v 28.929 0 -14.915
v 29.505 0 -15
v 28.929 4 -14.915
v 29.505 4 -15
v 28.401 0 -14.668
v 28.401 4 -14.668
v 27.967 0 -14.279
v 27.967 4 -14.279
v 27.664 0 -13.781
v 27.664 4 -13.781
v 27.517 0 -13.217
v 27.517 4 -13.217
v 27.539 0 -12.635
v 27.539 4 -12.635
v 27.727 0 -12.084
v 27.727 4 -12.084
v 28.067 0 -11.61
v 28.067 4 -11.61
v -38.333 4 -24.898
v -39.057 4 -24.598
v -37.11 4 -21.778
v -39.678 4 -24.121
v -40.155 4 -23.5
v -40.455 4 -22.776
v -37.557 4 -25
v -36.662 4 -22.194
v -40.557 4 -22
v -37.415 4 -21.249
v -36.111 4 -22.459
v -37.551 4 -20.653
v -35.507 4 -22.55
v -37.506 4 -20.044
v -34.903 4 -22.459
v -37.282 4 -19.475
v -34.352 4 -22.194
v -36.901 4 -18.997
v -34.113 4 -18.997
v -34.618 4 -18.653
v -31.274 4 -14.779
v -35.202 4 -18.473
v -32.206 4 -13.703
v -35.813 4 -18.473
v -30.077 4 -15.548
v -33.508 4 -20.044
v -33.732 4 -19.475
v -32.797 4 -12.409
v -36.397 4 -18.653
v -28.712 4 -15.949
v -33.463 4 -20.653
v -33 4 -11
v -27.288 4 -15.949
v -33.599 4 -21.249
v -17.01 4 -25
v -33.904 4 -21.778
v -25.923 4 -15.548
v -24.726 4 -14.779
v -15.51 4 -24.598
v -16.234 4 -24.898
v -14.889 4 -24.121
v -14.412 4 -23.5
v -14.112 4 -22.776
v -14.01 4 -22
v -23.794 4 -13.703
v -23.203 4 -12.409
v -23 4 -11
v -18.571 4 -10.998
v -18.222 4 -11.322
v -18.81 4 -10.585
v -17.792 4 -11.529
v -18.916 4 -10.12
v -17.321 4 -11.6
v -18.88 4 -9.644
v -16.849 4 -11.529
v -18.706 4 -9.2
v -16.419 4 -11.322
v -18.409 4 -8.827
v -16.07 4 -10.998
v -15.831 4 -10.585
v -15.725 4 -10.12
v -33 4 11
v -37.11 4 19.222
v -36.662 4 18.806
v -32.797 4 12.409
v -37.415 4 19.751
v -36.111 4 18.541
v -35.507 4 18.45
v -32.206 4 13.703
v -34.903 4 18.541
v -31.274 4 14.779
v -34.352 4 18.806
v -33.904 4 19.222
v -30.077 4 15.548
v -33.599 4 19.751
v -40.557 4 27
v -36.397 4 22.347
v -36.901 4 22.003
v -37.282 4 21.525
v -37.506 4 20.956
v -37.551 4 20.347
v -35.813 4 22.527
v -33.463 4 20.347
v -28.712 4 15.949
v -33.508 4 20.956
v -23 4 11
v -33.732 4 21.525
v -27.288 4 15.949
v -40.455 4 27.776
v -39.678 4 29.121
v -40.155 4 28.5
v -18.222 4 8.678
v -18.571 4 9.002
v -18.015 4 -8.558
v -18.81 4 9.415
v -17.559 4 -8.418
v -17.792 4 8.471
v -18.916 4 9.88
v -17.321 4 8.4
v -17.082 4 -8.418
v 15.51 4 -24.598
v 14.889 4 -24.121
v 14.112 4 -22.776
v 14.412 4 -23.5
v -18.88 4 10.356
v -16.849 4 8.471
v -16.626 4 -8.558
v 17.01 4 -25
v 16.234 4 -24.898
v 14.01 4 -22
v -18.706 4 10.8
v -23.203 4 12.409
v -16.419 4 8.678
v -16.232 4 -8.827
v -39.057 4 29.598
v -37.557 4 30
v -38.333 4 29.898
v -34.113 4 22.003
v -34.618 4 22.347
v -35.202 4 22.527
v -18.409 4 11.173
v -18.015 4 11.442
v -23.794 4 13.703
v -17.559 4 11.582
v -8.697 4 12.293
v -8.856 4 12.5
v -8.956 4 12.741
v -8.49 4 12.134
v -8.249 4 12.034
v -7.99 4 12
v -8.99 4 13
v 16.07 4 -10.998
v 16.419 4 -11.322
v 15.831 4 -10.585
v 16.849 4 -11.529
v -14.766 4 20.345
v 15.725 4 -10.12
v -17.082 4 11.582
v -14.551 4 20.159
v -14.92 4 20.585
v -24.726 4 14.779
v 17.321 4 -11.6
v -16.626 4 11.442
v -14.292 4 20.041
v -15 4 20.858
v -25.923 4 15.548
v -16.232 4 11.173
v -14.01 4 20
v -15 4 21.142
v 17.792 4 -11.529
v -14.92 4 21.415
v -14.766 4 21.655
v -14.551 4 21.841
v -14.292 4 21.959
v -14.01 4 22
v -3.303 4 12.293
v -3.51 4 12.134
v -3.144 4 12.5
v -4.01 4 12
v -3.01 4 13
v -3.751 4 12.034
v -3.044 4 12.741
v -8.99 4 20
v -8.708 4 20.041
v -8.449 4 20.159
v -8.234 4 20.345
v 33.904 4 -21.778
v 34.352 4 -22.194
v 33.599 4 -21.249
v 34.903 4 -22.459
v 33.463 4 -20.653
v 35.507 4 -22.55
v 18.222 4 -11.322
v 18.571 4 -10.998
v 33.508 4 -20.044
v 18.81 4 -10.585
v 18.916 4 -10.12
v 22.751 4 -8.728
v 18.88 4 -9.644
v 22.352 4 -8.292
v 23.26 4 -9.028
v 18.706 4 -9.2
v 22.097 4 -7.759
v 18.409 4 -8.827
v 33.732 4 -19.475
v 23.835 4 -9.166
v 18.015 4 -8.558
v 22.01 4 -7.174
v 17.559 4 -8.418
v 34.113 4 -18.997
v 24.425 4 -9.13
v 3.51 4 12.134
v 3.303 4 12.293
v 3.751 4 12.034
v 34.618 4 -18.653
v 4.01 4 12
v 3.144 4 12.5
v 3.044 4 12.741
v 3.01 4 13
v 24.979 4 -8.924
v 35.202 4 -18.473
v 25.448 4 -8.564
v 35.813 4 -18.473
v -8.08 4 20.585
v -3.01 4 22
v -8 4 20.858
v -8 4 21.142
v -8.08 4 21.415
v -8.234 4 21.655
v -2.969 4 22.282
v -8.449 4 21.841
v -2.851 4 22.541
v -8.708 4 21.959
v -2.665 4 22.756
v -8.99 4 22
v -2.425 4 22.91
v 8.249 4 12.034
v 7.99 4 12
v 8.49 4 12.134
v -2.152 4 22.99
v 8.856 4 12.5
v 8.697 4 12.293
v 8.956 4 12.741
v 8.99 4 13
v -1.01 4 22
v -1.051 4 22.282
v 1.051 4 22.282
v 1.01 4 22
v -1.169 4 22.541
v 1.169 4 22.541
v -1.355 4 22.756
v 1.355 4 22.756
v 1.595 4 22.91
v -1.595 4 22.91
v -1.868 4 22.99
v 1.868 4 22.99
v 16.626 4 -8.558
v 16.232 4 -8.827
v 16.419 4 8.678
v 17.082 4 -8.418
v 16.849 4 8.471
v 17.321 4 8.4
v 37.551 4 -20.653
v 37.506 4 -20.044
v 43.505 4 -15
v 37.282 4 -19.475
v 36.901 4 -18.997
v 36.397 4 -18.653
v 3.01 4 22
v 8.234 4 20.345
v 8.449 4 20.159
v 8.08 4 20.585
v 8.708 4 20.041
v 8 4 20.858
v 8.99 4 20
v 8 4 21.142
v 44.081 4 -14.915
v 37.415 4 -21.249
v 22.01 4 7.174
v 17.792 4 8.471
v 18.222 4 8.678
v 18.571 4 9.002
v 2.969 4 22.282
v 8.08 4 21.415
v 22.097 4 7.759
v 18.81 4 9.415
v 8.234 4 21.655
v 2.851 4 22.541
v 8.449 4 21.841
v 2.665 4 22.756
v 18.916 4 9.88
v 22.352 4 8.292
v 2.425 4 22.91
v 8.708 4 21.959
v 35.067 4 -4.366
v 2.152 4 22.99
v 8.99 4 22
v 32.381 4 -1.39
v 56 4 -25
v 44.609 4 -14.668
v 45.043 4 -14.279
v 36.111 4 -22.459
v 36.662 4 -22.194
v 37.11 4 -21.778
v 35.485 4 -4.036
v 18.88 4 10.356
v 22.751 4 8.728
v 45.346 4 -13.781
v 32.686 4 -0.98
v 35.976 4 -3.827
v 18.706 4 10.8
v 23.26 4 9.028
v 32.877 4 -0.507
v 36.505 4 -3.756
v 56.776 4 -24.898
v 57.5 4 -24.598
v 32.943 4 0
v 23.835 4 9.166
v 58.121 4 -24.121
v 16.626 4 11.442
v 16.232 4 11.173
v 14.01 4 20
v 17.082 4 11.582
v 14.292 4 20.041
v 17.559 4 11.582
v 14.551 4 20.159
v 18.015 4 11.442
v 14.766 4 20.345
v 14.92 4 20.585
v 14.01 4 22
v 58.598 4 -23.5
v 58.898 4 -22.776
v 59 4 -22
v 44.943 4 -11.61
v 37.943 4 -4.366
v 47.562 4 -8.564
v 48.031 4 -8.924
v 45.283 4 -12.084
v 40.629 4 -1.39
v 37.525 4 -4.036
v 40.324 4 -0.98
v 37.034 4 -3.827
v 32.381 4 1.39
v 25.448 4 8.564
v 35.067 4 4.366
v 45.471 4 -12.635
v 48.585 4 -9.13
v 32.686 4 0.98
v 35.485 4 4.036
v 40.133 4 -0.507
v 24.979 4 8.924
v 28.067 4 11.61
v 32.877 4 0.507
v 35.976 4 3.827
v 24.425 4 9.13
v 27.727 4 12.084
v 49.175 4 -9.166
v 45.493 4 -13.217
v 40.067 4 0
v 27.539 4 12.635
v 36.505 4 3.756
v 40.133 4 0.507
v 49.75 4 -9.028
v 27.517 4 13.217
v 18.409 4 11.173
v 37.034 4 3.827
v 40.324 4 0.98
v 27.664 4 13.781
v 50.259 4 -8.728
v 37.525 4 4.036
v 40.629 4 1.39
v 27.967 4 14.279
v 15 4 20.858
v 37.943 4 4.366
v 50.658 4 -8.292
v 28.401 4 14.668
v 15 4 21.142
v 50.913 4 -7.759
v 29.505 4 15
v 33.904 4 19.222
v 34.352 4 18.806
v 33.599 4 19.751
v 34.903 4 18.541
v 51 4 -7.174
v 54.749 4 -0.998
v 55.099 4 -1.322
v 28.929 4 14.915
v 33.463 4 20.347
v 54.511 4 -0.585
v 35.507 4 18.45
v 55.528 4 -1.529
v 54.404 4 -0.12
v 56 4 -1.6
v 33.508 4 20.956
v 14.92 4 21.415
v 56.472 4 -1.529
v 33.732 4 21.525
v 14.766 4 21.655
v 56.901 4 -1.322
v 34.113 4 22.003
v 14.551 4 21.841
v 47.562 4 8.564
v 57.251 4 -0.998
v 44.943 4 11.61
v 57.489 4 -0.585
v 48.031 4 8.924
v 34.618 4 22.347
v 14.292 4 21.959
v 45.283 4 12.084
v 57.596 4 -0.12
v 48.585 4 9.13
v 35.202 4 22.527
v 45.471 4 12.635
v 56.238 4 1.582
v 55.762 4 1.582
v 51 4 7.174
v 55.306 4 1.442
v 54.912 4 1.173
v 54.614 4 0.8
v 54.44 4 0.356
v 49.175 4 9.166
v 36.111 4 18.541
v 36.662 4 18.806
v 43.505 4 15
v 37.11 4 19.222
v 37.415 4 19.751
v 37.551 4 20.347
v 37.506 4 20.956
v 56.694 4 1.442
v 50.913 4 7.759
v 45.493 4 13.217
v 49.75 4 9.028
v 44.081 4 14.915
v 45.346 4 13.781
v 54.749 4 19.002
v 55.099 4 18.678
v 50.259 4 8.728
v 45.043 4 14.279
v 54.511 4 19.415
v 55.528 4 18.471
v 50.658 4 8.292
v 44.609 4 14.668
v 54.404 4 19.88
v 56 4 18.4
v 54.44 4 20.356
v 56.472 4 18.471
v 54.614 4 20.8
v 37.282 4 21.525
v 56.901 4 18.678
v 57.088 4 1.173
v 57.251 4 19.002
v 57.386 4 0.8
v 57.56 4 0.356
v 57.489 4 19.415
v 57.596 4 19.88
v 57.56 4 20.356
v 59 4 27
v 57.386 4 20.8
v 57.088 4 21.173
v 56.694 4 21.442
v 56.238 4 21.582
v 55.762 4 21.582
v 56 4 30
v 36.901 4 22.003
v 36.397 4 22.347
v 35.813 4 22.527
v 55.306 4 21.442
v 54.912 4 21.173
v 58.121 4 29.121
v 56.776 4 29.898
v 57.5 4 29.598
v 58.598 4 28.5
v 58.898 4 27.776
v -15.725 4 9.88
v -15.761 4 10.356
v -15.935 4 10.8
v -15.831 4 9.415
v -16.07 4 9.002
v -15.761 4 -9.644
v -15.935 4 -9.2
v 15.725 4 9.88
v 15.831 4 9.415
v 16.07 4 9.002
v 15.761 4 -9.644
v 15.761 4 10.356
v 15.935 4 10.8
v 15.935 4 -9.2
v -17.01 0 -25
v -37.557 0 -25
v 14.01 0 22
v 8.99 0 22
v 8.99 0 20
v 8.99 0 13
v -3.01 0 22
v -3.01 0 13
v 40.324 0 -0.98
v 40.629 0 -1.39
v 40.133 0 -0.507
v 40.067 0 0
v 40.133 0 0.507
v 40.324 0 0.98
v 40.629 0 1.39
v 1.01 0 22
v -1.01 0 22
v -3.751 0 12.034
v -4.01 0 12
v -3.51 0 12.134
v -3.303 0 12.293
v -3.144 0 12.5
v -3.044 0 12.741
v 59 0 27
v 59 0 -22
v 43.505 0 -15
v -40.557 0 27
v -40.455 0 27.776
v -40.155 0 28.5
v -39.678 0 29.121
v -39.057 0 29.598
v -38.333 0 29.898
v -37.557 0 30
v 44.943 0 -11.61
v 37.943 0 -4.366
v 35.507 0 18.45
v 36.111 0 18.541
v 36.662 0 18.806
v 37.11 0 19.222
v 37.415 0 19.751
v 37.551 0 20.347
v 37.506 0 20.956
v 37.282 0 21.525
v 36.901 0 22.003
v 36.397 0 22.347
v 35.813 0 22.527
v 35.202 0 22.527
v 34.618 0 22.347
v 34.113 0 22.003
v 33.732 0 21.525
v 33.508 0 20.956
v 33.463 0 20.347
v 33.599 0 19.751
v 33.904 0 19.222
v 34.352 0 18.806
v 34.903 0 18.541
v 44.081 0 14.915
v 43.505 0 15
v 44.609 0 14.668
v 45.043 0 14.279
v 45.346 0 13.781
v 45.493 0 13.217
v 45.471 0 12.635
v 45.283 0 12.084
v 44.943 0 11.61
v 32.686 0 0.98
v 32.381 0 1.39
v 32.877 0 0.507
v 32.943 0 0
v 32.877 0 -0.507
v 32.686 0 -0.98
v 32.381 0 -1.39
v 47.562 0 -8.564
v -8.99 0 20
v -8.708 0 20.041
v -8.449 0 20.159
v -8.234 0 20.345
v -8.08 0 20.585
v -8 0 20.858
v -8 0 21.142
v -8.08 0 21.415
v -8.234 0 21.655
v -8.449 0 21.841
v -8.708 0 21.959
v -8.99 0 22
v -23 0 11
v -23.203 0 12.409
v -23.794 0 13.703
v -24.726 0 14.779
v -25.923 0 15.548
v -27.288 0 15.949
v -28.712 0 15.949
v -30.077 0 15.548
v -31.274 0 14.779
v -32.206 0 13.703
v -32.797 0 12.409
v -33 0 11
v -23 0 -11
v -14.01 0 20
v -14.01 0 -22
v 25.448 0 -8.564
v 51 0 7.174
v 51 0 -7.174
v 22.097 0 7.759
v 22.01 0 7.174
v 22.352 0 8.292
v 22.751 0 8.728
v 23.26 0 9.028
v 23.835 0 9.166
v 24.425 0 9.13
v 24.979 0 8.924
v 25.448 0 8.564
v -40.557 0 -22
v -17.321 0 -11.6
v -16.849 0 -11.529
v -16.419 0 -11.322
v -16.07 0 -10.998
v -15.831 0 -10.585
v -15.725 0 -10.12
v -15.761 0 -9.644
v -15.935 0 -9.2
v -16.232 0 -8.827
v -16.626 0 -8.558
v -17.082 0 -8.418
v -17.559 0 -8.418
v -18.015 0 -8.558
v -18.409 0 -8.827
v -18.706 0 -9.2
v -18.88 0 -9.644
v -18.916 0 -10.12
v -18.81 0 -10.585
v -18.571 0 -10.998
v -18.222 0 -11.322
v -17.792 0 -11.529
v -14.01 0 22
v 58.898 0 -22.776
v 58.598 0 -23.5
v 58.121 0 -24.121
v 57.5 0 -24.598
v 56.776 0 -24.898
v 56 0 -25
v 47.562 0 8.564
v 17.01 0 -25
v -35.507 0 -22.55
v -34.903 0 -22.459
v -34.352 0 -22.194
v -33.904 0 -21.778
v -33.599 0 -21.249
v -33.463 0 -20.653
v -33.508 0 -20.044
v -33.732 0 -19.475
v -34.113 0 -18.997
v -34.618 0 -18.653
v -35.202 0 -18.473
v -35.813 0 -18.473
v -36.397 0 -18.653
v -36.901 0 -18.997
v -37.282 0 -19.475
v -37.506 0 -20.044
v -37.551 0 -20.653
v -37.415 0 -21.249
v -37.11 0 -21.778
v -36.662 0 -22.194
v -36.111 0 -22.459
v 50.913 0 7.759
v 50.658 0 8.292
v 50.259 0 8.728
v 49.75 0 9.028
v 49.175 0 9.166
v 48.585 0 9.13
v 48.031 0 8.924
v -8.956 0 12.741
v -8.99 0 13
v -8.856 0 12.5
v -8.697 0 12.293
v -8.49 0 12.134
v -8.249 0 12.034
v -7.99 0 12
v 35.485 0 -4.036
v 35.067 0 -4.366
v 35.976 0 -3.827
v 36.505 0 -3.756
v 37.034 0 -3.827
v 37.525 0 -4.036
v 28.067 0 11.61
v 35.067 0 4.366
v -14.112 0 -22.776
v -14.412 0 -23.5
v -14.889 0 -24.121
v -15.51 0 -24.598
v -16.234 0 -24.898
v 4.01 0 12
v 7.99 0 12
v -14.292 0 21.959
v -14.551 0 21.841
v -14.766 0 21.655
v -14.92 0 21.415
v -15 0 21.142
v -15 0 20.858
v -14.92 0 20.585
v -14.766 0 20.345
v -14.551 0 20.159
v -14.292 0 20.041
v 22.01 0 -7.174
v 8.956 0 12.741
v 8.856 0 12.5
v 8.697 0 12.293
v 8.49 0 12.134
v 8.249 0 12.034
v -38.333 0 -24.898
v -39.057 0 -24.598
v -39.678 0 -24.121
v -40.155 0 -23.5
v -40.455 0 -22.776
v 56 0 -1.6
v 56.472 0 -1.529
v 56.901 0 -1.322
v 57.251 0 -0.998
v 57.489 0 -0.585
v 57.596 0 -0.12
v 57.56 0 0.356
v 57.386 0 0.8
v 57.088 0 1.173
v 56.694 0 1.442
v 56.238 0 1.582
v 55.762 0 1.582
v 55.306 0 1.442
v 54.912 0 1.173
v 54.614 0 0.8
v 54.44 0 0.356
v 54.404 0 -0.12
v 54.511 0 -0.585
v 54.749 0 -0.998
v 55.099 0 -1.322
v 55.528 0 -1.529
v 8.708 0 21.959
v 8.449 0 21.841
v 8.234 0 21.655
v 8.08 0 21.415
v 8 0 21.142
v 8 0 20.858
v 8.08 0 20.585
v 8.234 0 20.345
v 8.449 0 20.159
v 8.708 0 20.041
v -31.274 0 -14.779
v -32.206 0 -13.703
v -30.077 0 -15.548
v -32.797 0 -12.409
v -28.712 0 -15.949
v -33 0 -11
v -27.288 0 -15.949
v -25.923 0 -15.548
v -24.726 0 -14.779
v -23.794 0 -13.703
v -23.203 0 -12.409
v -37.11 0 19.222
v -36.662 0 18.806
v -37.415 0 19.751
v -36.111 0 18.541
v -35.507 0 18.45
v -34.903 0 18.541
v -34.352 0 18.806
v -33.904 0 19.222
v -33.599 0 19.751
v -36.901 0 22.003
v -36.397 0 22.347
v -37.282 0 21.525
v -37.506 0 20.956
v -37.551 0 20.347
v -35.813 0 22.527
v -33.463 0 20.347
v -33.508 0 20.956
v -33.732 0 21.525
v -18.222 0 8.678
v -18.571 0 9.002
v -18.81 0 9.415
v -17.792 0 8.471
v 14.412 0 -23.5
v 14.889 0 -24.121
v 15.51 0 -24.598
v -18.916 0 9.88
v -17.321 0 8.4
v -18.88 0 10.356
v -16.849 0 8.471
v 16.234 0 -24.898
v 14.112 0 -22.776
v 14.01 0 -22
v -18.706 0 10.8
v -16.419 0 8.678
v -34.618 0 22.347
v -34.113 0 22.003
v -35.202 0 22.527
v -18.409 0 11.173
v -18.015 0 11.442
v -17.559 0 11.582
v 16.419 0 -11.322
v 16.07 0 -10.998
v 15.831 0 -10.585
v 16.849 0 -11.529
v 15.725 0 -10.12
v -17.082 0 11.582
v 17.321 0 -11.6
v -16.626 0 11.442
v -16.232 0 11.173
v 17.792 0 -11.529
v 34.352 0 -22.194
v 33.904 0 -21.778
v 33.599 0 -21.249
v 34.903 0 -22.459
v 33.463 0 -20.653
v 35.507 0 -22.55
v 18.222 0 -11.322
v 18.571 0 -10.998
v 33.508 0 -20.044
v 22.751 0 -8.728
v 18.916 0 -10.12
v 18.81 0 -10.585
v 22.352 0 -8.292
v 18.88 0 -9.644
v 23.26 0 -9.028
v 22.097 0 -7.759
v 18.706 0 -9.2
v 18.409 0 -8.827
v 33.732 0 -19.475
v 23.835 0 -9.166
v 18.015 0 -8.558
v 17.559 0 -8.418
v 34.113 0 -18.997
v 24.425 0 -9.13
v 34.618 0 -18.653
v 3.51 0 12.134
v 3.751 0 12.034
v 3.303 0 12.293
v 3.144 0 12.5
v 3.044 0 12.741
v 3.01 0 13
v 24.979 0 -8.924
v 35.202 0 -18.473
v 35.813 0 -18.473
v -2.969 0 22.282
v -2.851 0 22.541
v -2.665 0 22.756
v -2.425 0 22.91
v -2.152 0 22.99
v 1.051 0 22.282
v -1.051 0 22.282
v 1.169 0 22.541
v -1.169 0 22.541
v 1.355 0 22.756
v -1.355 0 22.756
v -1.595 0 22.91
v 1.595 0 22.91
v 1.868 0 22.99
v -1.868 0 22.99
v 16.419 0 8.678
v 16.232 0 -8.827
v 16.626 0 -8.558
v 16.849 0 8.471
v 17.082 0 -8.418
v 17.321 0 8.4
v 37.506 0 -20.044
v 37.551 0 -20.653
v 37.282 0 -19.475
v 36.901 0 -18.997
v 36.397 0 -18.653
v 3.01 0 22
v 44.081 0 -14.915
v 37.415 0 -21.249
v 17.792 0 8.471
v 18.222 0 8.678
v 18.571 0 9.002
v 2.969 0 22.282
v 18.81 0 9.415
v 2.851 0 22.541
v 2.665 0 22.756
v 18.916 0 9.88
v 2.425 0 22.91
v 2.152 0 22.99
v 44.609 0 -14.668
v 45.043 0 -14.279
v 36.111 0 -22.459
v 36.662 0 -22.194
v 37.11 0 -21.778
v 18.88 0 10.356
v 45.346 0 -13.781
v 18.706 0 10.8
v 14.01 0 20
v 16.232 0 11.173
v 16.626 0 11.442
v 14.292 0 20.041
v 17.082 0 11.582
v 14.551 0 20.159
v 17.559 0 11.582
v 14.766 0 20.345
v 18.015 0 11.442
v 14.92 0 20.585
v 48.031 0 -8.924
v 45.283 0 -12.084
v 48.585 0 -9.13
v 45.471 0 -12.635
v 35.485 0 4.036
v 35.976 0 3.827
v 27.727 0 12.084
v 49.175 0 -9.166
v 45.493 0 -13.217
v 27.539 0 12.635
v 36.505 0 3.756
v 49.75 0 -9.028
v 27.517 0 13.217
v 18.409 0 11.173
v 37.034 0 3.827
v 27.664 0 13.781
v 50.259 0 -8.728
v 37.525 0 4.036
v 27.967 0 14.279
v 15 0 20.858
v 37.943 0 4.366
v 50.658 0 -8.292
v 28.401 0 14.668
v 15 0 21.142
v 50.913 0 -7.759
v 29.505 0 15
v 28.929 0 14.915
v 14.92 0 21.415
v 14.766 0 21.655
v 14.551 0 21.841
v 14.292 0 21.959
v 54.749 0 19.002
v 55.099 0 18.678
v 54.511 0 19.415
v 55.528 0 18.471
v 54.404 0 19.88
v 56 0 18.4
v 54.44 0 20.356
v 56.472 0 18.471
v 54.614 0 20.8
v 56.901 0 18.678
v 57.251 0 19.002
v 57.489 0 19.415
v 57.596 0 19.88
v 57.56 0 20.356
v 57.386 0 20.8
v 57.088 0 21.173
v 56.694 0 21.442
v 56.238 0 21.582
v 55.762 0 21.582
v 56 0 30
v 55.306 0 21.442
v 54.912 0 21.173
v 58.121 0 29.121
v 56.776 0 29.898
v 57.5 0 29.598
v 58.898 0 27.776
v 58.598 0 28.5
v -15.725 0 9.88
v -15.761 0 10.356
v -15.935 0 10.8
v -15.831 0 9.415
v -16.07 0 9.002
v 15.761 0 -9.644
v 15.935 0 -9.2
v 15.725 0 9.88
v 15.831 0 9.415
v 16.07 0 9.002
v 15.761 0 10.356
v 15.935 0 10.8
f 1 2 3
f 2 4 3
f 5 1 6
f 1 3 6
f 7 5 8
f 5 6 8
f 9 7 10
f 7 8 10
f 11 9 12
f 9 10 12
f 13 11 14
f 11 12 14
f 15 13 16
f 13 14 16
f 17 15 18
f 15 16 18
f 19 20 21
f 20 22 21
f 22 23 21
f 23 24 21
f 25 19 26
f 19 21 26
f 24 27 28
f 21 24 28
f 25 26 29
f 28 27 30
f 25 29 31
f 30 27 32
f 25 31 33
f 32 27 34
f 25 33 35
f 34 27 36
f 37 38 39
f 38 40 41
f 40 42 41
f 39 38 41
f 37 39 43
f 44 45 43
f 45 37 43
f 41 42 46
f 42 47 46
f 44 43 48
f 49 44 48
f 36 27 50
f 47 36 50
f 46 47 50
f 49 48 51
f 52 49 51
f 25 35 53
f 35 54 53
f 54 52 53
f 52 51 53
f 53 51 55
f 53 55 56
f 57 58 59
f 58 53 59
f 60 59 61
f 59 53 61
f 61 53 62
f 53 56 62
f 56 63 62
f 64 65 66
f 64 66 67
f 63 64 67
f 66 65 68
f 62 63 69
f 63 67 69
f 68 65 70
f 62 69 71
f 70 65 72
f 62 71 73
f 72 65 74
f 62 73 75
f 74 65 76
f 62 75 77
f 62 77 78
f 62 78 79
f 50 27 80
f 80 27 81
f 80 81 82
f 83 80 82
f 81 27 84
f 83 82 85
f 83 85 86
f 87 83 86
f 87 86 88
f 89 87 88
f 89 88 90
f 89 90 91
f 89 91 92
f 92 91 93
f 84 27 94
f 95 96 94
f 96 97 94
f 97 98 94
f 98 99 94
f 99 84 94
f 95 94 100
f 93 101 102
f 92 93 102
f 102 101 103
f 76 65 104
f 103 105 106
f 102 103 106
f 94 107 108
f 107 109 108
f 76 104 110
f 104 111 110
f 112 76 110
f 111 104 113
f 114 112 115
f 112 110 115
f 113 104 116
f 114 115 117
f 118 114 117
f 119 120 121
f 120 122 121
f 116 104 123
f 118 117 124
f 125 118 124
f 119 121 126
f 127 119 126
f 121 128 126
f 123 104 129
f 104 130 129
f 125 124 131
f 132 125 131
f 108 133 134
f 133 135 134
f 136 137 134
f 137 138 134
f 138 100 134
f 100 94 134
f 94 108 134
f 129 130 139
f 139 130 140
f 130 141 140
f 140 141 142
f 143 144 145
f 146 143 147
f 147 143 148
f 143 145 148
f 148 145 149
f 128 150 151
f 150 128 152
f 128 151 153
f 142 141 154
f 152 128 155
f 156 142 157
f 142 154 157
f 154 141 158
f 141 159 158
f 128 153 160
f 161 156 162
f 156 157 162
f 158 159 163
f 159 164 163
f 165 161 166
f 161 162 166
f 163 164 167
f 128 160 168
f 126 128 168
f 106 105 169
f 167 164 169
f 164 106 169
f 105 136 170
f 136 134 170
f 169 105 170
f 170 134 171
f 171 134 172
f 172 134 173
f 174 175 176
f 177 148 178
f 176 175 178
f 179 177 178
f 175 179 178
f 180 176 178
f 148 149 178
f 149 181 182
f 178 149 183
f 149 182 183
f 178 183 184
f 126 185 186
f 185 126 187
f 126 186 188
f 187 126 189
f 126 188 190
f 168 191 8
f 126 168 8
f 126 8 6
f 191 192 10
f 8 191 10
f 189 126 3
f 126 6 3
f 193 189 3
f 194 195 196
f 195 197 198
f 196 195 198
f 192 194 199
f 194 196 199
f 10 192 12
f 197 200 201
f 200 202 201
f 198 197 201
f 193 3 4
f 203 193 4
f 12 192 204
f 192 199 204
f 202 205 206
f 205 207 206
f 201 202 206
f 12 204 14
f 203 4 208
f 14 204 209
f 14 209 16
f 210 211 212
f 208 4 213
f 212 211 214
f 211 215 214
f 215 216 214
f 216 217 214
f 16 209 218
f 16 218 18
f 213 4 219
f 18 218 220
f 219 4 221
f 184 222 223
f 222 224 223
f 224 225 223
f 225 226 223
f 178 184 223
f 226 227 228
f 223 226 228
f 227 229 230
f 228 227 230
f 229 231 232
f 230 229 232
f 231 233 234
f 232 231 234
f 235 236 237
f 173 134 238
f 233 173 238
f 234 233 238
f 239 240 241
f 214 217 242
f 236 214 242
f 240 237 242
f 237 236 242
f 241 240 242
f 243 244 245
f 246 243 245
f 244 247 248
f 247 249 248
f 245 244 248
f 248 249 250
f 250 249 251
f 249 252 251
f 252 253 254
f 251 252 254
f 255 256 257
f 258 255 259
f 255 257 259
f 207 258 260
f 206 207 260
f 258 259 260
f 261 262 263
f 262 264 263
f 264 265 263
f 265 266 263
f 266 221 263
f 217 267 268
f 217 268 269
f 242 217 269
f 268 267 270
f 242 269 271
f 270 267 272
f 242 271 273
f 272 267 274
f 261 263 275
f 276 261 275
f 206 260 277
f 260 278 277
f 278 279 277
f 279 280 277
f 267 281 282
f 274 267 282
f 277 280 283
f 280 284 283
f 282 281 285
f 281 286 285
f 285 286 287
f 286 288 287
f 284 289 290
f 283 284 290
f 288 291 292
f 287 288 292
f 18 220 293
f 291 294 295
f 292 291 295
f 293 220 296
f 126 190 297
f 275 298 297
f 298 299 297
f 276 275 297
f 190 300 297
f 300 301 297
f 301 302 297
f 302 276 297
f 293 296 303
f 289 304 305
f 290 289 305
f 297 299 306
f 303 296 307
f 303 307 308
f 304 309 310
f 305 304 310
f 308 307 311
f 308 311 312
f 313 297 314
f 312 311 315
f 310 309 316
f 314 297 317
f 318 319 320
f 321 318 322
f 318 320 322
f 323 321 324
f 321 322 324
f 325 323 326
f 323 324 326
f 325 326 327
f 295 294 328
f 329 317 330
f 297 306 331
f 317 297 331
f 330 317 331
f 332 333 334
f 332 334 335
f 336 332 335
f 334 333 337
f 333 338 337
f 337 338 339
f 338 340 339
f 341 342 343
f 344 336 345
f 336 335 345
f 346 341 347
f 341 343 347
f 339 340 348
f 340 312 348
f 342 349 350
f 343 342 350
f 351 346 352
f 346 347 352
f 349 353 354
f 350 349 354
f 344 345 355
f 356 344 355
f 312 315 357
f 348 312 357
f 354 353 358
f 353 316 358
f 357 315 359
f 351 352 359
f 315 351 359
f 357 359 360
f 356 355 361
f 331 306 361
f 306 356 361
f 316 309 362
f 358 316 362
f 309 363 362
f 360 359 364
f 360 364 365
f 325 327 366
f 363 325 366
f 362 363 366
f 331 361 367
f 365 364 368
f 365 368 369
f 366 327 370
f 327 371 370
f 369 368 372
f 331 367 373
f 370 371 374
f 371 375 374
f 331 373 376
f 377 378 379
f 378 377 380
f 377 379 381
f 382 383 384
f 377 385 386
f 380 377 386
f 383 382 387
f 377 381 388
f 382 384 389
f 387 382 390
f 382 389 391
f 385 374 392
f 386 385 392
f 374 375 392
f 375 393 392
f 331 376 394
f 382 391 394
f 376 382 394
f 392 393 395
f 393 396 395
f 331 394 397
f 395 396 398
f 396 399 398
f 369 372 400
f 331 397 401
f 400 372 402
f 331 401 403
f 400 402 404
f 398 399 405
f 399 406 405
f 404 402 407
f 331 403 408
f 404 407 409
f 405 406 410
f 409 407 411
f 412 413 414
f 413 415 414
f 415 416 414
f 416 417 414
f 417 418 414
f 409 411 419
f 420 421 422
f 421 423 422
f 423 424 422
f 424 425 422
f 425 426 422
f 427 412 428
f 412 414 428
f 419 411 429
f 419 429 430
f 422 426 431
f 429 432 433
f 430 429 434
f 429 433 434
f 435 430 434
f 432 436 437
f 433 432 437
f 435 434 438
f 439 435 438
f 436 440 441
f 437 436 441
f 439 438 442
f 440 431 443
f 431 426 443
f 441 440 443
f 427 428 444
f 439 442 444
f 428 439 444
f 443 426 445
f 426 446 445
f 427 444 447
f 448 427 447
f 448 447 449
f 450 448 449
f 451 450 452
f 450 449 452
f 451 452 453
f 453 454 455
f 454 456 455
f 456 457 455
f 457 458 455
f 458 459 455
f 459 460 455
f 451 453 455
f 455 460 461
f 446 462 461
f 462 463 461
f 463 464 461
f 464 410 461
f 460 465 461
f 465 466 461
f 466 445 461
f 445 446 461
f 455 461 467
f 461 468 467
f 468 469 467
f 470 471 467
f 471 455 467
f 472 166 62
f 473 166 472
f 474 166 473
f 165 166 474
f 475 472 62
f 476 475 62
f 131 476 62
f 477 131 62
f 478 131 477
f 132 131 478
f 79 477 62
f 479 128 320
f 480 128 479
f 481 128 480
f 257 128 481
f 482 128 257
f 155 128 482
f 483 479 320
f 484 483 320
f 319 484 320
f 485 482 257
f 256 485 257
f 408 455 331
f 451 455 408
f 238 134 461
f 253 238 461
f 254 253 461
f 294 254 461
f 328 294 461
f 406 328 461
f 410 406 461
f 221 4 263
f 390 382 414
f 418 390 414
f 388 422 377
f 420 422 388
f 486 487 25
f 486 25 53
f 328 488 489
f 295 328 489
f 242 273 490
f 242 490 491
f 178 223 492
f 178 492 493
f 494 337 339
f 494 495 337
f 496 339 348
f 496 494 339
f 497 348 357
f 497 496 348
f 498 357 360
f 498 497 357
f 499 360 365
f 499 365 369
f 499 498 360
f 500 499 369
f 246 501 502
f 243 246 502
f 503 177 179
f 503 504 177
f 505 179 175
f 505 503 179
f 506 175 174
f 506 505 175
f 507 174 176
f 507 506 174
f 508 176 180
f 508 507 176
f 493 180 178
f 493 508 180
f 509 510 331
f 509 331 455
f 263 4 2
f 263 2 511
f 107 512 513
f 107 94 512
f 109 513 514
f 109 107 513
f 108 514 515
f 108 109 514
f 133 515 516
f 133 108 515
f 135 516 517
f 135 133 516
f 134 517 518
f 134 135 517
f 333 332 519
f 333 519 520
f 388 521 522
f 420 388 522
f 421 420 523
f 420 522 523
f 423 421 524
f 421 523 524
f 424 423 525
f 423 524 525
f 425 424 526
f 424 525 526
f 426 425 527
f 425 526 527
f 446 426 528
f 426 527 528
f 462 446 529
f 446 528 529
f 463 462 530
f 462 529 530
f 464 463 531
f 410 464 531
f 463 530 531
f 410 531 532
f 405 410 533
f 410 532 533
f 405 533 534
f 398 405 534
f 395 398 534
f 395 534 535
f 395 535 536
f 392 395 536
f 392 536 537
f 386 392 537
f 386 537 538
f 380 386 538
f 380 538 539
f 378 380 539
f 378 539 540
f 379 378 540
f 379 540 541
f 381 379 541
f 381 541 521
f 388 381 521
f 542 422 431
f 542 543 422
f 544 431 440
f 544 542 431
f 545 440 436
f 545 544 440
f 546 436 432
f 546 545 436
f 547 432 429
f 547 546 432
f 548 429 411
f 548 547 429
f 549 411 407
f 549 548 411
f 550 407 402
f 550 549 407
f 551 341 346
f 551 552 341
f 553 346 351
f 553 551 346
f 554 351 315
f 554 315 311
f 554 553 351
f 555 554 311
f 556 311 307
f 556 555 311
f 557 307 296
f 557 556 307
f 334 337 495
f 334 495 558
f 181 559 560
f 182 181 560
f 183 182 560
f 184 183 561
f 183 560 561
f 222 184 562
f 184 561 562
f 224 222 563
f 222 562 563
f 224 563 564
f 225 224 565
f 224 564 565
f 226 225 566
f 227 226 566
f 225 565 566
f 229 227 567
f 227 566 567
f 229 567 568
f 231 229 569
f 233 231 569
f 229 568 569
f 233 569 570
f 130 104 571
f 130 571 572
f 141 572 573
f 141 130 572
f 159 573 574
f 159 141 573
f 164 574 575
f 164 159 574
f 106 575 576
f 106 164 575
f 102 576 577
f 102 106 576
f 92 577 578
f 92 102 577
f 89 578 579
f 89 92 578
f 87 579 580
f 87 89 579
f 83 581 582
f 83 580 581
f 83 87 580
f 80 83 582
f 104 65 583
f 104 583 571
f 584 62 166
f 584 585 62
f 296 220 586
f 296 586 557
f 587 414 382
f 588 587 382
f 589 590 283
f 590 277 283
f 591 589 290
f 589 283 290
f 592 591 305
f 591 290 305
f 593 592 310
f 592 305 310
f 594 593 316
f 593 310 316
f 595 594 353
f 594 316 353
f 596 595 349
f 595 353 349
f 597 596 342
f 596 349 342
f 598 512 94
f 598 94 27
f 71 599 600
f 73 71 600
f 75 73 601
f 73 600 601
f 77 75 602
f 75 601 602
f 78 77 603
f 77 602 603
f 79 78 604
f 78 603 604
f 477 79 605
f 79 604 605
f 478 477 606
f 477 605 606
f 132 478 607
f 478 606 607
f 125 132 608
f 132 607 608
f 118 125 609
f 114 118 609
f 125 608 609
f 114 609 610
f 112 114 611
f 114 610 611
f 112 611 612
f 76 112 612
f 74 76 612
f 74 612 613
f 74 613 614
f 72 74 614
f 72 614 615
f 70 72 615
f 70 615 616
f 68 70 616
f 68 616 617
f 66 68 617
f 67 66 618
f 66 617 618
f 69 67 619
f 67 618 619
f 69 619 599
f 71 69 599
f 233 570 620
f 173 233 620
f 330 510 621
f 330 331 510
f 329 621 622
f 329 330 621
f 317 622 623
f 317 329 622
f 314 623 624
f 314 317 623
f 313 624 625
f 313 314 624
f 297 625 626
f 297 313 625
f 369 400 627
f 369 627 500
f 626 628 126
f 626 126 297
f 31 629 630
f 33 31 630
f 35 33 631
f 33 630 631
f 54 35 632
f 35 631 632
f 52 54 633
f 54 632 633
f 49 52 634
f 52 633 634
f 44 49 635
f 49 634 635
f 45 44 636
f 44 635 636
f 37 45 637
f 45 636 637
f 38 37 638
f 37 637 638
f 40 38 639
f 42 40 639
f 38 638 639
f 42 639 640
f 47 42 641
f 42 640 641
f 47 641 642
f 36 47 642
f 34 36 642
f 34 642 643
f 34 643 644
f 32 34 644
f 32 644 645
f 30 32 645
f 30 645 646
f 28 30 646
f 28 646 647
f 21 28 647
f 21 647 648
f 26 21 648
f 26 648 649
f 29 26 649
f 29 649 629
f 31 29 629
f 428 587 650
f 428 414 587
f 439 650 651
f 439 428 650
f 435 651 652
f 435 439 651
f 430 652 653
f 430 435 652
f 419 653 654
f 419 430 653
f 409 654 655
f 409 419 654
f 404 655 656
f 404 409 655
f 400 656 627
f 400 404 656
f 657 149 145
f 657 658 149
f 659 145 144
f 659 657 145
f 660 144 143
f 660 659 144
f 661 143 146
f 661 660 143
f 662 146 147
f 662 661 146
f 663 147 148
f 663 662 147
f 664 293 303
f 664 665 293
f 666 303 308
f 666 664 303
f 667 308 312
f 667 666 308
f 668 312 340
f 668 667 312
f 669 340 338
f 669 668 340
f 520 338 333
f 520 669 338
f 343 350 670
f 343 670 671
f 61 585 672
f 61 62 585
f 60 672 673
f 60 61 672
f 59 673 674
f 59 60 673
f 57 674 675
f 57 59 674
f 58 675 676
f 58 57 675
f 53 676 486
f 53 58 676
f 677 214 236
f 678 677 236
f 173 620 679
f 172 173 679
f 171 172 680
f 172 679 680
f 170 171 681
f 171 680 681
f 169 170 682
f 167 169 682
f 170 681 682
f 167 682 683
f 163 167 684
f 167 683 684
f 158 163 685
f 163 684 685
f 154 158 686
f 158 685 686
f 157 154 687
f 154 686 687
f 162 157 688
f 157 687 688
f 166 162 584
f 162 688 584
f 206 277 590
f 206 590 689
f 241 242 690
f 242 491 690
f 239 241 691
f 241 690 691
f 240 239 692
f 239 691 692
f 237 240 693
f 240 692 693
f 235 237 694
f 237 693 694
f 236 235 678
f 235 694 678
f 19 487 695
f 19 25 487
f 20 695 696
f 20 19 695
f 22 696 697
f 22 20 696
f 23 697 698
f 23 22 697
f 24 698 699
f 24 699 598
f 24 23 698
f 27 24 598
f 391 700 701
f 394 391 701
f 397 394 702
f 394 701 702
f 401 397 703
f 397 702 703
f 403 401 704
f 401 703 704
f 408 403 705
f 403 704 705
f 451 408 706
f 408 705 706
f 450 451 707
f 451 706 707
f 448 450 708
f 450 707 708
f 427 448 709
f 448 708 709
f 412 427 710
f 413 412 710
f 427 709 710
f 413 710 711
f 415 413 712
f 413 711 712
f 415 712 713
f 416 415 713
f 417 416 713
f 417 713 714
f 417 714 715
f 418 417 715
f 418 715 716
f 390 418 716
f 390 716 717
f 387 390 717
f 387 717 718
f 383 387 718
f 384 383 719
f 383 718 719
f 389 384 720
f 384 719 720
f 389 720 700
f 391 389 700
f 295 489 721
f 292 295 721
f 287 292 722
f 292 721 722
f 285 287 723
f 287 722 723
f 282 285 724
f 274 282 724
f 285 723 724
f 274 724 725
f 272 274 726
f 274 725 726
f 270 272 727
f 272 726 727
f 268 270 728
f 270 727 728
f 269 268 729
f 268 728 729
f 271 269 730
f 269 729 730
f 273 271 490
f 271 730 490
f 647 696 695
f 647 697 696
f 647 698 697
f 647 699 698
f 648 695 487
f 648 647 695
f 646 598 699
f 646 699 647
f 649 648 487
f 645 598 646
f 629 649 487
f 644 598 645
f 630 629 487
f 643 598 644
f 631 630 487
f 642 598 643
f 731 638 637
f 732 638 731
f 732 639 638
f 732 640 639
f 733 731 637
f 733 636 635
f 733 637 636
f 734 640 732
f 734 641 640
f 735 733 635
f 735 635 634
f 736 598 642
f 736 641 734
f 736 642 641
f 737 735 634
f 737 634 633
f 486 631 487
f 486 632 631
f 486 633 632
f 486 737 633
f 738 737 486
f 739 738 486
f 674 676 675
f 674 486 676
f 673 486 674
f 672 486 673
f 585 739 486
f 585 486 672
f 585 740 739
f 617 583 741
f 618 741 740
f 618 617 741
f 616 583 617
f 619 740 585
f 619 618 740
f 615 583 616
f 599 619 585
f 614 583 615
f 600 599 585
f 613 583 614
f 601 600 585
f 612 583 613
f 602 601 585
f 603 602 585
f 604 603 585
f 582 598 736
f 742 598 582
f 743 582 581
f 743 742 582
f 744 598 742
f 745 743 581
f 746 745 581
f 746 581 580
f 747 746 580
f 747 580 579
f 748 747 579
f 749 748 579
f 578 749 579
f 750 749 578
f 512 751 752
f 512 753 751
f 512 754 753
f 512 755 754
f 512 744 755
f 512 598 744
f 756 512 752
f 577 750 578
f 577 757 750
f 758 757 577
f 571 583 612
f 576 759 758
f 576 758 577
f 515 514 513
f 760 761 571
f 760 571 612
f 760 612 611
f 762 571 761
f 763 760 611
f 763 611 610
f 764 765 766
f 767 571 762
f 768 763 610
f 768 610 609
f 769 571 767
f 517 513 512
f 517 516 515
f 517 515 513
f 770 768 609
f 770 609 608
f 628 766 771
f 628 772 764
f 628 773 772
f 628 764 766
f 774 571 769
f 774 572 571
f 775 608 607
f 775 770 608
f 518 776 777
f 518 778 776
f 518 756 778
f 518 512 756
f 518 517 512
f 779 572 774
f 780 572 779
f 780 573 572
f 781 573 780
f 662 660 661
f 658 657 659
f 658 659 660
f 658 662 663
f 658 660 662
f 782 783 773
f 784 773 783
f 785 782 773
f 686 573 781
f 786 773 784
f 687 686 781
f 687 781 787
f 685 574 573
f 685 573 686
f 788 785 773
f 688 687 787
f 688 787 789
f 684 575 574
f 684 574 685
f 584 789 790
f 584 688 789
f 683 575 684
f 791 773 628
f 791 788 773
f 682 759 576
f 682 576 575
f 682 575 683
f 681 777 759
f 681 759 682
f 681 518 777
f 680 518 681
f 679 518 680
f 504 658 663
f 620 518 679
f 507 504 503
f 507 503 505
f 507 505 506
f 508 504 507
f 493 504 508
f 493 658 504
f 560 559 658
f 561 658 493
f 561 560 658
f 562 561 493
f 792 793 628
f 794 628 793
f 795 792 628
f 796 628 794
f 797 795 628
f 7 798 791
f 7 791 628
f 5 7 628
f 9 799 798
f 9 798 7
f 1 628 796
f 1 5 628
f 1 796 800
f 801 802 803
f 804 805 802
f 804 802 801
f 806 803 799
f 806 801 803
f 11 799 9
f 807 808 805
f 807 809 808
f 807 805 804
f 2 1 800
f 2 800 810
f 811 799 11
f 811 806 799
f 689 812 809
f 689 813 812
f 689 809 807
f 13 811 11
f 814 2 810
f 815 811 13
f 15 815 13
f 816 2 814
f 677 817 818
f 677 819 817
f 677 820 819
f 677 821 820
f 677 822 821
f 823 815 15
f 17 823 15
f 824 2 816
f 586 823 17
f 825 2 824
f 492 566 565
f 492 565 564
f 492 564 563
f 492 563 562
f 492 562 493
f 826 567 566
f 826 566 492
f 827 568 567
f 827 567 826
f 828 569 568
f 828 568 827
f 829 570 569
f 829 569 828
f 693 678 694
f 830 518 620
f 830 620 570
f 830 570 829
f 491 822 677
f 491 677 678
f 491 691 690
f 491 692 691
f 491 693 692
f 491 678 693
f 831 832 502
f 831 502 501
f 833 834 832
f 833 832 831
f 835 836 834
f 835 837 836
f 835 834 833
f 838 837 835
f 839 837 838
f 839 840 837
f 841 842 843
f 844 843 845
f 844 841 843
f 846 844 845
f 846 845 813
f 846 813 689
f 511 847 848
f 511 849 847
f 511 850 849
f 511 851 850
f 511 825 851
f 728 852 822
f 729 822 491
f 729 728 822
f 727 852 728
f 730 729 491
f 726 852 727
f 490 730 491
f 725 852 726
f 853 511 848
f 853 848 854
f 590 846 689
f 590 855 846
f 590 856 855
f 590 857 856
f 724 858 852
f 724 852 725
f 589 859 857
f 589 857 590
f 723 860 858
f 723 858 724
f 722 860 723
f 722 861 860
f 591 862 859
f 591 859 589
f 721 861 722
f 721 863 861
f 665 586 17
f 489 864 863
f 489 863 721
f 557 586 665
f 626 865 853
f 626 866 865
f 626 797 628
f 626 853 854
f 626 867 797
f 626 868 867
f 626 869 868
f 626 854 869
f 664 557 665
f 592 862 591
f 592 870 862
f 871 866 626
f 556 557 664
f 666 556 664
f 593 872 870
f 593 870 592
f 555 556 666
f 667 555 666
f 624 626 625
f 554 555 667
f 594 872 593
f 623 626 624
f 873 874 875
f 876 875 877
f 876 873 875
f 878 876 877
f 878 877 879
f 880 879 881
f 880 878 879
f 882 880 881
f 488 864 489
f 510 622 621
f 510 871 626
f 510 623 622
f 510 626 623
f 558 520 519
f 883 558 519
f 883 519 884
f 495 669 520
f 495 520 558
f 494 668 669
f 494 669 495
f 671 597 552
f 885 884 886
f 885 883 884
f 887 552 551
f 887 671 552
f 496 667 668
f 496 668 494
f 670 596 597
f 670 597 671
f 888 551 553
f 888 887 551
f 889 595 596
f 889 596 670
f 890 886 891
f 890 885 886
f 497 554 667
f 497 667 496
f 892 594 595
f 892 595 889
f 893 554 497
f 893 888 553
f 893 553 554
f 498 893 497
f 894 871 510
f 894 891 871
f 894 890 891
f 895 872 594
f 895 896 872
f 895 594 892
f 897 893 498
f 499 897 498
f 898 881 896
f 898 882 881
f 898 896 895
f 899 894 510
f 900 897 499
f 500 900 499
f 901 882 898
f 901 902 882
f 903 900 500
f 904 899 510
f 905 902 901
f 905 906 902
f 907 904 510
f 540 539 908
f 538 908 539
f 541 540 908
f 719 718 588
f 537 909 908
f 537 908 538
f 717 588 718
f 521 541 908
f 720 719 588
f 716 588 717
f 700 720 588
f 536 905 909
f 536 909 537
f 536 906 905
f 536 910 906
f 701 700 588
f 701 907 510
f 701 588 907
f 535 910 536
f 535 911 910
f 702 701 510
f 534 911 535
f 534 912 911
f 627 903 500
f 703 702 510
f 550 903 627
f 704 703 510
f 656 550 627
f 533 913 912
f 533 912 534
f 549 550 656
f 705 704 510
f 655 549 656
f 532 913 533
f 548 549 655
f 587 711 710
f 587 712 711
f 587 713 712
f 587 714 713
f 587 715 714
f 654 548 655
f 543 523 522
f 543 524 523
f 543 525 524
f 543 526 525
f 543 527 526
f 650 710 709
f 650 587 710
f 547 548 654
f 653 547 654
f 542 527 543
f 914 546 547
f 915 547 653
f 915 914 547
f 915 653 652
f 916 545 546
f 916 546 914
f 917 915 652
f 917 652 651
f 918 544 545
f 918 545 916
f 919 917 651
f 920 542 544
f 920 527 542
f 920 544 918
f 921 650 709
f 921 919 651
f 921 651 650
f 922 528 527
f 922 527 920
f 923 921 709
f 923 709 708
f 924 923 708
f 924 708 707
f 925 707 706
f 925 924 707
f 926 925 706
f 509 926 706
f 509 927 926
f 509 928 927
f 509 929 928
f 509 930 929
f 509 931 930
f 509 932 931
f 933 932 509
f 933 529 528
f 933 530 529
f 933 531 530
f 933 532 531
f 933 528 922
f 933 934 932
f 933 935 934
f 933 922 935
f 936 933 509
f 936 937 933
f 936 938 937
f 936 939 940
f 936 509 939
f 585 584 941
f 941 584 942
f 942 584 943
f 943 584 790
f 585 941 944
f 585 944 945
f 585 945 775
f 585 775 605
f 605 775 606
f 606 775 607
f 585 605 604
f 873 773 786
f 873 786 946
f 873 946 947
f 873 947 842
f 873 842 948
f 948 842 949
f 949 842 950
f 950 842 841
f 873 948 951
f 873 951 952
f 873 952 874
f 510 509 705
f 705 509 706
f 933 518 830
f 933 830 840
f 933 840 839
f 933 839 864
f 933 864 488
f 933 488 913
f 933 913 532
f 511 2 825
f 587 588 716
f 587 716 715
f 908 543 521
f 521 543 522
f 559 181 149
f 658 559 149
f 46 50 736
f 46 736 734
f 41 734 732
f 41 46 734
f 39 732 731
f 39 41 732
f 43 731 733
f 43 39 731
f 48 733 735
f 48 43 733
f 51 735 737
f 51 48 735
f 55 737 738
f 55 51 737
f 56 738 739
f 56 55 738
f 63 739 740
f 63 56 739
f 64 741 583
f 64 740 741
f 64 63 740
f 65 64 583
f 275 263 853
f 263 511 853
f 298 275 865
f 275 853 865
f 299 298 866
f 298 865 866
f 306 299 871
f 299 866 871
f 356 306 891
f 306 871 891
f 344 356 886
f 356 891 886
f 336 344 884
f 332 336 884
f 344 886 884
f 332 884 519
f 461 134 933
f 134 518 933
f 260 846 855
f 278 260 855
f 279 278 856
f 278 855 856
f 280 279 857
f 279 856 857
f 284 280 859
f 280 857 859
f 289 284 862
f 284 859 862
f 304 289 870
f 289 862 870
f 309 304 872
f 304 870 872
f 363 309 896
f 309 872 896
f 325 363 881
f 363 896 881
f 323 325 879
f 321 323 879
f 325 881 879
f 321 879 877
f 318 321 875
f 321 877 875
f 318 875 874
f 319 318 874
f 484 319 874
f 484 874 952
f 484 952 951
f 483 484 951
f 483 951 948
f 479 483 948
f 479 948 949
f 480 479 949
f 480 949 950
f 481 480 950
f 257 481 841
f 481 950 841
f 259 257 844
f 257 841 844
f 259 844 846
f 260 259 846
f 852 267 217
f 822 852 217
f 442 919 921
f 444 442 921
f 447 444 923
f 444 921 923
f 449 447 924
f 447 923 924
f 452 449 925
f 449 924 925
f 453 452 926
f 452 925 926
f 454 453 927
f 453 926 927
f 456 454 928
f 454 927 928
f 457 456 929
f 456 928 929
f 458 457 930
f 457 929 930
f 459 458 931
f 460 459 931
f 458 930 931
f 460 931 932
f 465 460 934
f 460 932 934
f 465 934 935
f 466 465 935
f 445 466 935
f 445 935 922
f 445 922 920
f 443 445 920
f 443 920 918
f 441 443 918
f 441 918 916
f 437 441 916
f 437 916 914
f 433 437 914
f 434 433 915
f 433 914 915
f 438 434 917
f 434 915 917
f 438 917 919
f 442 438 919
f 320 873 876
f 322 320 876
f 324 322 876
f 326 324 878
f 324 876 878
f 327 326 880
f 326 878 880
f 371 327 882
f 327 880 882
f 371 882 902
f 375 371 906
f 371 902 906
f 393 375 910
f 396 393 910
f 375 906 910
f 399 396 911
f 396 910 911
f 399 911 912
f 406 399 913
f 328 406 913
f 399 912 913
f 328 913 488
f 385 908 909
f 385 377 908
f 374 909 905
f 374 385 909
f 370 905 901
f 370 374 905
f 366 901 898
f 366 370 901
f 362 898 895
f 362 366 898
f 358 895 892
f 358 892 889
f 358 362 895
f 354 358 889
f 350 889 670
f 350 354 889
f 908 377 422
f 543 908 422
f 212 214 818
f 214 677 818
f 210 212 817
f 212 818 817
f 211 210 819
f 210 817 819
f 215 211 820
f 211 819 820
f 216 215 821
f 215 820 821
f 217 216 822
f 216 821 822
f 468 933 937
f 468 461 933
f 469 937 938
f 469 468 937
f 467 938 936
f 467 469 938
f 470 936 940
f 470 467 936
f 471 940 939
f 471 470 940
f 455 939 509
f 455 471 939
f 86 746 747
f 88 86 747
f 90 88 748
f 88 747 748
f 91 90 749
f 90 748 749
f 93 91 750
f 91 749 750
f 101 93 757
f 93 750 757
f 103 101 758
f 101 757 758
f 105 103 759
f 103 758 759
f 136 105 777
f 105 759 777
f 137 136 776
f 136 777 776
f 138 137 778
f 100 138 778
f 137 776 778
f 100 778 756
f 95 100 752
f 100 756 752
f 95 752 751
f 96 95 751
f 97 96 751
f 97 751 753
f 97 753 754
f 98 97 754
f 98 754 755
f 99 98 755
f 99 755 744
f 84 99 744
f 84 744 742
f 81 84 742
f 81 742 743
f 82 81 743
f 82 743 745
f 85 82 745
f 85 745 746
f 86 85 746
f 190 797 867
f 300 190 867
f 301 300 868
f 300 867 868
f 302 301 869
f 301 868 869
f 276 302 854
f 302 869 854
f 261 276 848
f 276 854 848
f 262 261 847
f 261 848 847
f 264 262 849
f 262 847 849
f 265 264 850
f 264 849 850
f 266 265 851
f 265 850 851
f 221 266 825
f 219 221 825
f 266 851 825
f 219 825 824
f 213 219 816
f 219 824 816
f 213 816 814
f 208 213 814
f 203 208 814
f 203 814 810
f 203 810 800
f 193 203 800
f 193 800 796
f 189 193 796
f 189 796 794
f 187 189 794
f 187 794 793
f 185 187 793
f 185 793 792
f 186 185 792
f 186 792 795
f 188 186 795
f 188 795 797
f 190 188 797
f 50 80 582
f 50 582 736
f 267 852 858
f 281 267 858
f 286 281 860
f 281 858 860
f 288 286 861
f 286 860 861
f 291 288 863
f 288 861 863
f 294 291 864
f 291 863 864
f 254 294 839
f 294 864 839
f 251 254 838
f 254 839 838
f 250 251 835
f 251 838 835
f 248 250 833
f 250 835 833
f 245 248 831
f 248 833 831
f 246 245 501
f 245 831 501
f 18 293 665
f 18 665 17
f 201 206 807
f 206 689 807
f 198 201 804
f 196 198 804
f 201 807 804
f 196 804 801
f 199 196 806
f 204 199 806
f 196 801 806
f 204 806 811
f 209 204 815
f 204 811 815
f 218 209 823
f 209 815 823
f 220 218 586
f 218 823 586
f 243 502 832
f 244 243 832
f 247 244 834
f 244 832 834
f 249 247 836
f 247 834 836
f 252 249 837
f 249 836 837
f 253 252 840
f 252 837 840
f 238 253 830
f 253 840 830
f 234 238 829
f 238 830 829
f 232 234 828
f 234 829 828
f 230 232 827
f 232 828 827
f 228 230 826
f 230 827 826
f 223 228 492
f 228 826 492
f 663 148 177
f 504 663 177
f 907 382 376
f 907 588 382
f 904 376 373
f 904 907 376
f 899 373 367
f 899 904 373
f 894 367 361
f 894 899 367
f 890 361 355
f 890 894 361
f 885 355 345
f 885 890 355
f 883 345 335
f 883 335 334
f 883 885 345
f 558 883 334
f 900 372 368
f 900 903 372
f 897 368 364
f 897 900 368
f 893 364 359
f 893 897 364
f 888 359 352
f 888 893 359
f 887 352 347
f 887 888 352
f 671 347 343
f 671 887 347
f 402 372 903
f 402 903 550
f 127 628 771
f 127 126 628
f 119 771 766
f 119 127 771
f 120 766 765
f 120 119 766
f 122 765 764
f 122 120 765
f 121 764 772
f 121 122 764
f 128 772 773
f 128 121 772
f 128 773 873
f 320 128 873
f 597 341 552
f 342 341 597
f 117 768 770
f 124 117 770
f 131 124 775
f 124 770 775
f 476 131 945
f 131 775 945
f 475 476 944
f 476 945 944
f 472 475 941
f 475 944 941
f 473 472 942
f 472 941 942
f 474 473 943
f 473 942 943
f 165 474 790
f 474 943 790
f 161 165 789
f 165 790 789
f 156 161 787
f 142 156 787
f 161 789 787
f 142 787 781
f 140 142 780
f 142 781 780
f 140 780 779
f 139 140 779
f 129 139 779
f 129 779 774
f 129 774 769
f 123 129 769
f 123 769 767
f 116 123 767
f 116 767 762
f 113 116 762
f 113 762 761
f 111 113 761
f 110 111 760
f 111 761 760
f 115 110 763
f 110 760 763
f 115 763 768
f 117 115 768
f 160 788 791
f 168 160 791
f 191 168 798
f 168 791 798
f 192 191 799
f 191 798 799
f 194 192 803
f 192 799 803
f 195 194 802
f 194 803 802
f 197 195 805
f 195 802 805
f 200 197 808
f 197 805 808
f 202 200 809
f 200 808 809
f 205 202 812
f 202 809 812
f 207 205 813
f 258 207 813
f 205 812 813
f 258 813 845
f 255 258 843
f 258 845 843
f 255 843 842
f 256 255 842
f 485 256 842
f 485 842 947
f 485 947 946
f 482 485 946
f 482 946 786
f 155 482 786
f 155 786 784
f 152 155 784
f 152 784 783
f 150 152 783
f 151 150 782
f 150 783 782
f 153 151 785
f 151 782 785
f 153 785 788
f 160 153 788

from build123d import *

# Parameters (mm, degrees)
EXTRUDE_1_DEPTH     = 4
SKETCH_2_W          = 5.98
SKETCH_2_H          = 10
EXTRUDE_2_DEPTH     = 4
SKETCH_4_R          = 1
SKETCH_4_W          = 55
SKETCH_4_H          = 8
CUT_EXTRUDE_1_DEPTH = 4
SKETCH_5_R          = 1.6
CUT_EXTRUDE_2_DEPTH = 4
SKETCH_6_W          = 31.5
SKETCH_6_H          = 52
EXTRUDE_3_DEPTH     = 4
SKETCH_7_R          = 1.6
CUT_EXTRUDE_3_DEPTH = 4
SKETCH_8_W          = 13.057041555
SKETCH_8_H          = 52
SKETCH_8_W_2        = 44.99
SKETCH_8_H_2        = 3
EXTRUDE_4_DEPTH     = 4
SKETCH_10_R         = 2.05
CUT_EXTRUDE_4_DEPTH = 10
FILLET_1_R          = 1
FILLET_2_R          = 3
SKETCH_11_W         = 28.99
SKETCH_11_H         = 30
CUT_EXTRUDE_5_DEPTH = 10
EXTRUDE_1_2_DEPTH   = 4
FILLET_3_R          = 2
SKETCH_13_R         = 1.6
EXTRUDE_5_DEPTH     = 4
SKETCH_15_R         = 1.6
CUT_EXTRUDE_6_DEPTH = 4


with BuildPart() as part:
    # 草图1 → Extrude 1 (new body)
    with BuildSketch(Plane(origin=(0, 0, 0), x_dir=(1, 0, 0), z_dir=(0, 1, 0))):
        Polygon((-14.01, 30), (-27.5, 30), (-27.5, -30), (27.5, -30), (27.5, 30), (14.01, 30), (14.01, 22), (14.01, -22), (-14.01, -22), (-14.01, 22), align=None)
    extrude(amount=EXTRUDE_1_DEPTH)

    # 草图2 → 凸台-拉伸2 (add)
    with BuildSketch(Plane(origin=(0, 4, 0), x_dir=(1, 0, 0), z_dir=(0, 1, 0))):
        with Locations((-6, -17)):
            Rectangle(SKETCH_2_W, SKETCH_2_H)
        with Locations((6, -17)):
            Rectangle(SKETCH_2_W, SKETCH_2_H)
    extrude(amount=-EXTRUDE_2_DEPTH)

    # 草图4 → 切除-拉伸1 (cut)
    with BuildSketch(Plane.XZ):
        with Locations((8.99, 21)):
            Circle(SKETCH_4_R)
        with Locations((14.01, 21)):
            Circle(SKETCH_4_R)
        with Locations((-2.01, 22)):
            Circle(SKETCH_4_R)
        with Locations((2.01, 22)):
            Circle(SKETCH_4_R)
        with Locations((-14.01, 21)):
            Circle(SKETCH_4_R)
        with Locations((-8.99, 21)):
            Circle(SKETCH_4_R)
        with Locations((0, -26)):
            Rectangle(SKETCH_4_W, SKETCH_4_H)
    extrude(amount=-CUT_EXTRUDE_1_DEPTH, mode=Mode.SUBTRACT)

    # 草图5 → 切除-拉伸2 (cut)
    with BuildSketch(Plane.XZ):
        with Locations(Location((17.01, 10, 0), (0, 0, 270))):
            Circle(SKETCH_5_R)
        with Locations(Location((17.01, -10, 0), (0, 0, 270))):
            Circle(SKETCH_5_R)
        with Locations(Location((-17.01, -10, 0), (0, 0, 270))):
            Circle(SKETCH_5_R)
        with Locations(Location((-17.01, 10, 0), (0, 0, 270))):
            Circle(SKETCH_5_R)
    extrude(amount=-CUT_EXTRUDE_2_DEPTH, mode=Mode.SUBTRACT)

    # 草图6 → 凸台-拉伸3 (add)
    with BuildSketch(Plane.XZ):
        with Locations((43.25, 4)):
            Rectangle(SKETCH_6_W, SKETCH_6_H)
    extrude(amount=-EXTRUDE_3_DEPTH)

    # 草图7 → 切除-拉伸3 (cut)
    with BuildSketch(Plane.XZ):
        with Locations(Location((56, 20, 0), (0, 0, 270))):
            Circle(SKETCH_7_R)
        with Locations(Location((56, 0, 0), (0, 0, 270))):
            Circle(SKETCH_7_R)
    extrude(amount=-CUT_EXTRUDE_3_DEPTH, mode=Mode.SUBTRACT)

    # 草图8 → 凸台-拉伸4 (add)
    with BuildSketch(Plane.XZ):
        with Locations((-34.028520778, 4)):
            Rectangle(SKETCH_8_W, SKETCH_8_H)
        Polygon((-14.01, -25), (-14.01, -22), (-27.5, -22), (-40.557041555, -22), (-40.557041555, -25), align=None)
        with Locations((36.505, -23.5)):
            Rectangle(SKETCH_8_W_2, SKETCH_8_H_2)
    extrude(amount=-EXTRUDE_4_DEPTH)

    # 草图10 → 切除-拉伸4 (cut)
    with BuildSketch(Plane.XZ):
        with Locations(Location((-35.507041555, -20.5, 0), (0, 0, 270))):
            Circle(SKETCH_10_R)
        with Locations(Location((-35.507041555, 20.5, 0), (0, 0, 270))):
            Circle(SKETCH_10_R)
        with Locations(Location((35.507041555, 20.5, 0), (0, 0, 270))):
            Circle(SKETCH_10_R)
        with Locations(Location((35.507041555, -20.5, 0), (0, 0, 270))):
            Circle(SKETCH_10_R)
    extrude(amount=-CUT_EXTRUDE_4_DEPTH, mode=Mode.SUBTRACT)

    # 圆角1
    fillet_1_edges = [part.edges().sort_by_distance(p)[0] for p in [
        (-8.99, 2, 12),
        (-3.01, 2, 12),
        (3.01, 2, 12),
        (8.99, 2, 12),
    ]]
    fillet(fillet_1_edges, radius=FILLET_1_R)

    # 圆角2
    fillet_2_edges = [part.edges().sort_by_distance(p)[0] for p in [
        (59, 2, 30),
        (-40.557041555, 2, -25),
        (-14.01, 2, -25),
        (-40.557041555, 2, 30),
        (14.01, 2, -25),
        (59, 2, -25),
    ]]
    fillet(fillet_2_edges, radius=FILLET_2_R)

    # 草图11 → 切除-拉伸5 (cut)
    with BuildSketch(Plane(origin=(0, 4, 0), x_dir=(1, 0, 0), z_dir=(0, 1, 0))):
        with Locations((36.505, 0)):
            Rectangle(SKETCH_11_W, SKETCH_11_H)
        with BuildLine():
            Line((-23, 11), (-23, -11))
            ThreePointArc((-23, -11), (-28, -16), (-33, -11))
            Line((-33, -11), (-33, 11))
            ThreePointArc((-33, 11), (-28, 16), (-23, 11))
        make_face()
    extrude(amount=-CUT_EXTRUDE_5_DEPTH, mode=Mode.SUBTRACT)

    # 草图12 → Extrude 1 2 (add)
    with BuildSketch(Plane(origin=(0, 4, 0), x_dir=(1, 0, 0), z_dir=(0, 1, 0))):
        Polygon((20.571783704, 13.610203653), (49.561783704, -16.389796347), (52.438216296, -13.610203653), (23.448216296, 16.389796347), align=None)
        Polygon((23.448216296, -16.389796347), (52.438216296, 13.610203653), (49.561783704, 16.389796347), (20.571783704, -13.610203653), align=None)
    extrude(amount=-EXTRUDE_1_2_DEPTH)

    # 圆角3
    fillet_3_edges = [part.edges().sort_by_distance(p)[0] for p in [
        (24.791222833, 2, 15),
        (48.218777167, 2, 15),
        (51, 2, -12.121880477),
        (51, 2, 12.121880477),
        (48.218777167, 2, -15),
        (24.791222833, 2, -15),
        (22.01, 2, 12.121880477),
        (22.01, 2, -12.121880477),
        (33.723777167, 2, 0),
        (36.505, 2, -2.878119523),
        (39.286222833, 2, 0),
        (36.505, 2, 2.878119523),
    ]]
    fillet(fillet_3_edges, radius=FILLET_3_R)

    # 草图13 → 凸台-拉伸5 (add)
    with BuildSketch(Plane.XZ):
        with Locations((17.01, -10)):
            Circle(SKETCH_13_R)
        with Locations((17.01, 10)):
            Circle(SKETCH_13_R)
        with Locations((-17.01, -10)):
            Circle(SKETCH_13_R)
        with Locations((-17.01, 10)):
            Circle(SKETCH_13_R)
    extrude(amount=-EXTRUDE_5_DEPTH)

    # 草图15 → 切除-拉伸6 (cut)
    with BuildSketch(Plane.XZ):
        with Locations(Location((-17.320508076, -10, 0), (0, 0, 270))):
            Circle(SKETCH_15_R)
        with Locations(Location((-17.320508076, 10, 0), (0, 0, 270))):
            Circle(SKETCH_15_R)
        with Locations(Location((17.320508076, 10, 0), (0, 0, 270))):
            Circle(SKETCH_15_R)
        with Locations(Location((17.320508076, -10, 0), (0, 0, 270))):
            Circle(SKETCH_15_R)
    extrude(amount=-CUT_EXTRUDE_6_DEPTH, mode=Mode.SUBTRACT)


solid = part.part
